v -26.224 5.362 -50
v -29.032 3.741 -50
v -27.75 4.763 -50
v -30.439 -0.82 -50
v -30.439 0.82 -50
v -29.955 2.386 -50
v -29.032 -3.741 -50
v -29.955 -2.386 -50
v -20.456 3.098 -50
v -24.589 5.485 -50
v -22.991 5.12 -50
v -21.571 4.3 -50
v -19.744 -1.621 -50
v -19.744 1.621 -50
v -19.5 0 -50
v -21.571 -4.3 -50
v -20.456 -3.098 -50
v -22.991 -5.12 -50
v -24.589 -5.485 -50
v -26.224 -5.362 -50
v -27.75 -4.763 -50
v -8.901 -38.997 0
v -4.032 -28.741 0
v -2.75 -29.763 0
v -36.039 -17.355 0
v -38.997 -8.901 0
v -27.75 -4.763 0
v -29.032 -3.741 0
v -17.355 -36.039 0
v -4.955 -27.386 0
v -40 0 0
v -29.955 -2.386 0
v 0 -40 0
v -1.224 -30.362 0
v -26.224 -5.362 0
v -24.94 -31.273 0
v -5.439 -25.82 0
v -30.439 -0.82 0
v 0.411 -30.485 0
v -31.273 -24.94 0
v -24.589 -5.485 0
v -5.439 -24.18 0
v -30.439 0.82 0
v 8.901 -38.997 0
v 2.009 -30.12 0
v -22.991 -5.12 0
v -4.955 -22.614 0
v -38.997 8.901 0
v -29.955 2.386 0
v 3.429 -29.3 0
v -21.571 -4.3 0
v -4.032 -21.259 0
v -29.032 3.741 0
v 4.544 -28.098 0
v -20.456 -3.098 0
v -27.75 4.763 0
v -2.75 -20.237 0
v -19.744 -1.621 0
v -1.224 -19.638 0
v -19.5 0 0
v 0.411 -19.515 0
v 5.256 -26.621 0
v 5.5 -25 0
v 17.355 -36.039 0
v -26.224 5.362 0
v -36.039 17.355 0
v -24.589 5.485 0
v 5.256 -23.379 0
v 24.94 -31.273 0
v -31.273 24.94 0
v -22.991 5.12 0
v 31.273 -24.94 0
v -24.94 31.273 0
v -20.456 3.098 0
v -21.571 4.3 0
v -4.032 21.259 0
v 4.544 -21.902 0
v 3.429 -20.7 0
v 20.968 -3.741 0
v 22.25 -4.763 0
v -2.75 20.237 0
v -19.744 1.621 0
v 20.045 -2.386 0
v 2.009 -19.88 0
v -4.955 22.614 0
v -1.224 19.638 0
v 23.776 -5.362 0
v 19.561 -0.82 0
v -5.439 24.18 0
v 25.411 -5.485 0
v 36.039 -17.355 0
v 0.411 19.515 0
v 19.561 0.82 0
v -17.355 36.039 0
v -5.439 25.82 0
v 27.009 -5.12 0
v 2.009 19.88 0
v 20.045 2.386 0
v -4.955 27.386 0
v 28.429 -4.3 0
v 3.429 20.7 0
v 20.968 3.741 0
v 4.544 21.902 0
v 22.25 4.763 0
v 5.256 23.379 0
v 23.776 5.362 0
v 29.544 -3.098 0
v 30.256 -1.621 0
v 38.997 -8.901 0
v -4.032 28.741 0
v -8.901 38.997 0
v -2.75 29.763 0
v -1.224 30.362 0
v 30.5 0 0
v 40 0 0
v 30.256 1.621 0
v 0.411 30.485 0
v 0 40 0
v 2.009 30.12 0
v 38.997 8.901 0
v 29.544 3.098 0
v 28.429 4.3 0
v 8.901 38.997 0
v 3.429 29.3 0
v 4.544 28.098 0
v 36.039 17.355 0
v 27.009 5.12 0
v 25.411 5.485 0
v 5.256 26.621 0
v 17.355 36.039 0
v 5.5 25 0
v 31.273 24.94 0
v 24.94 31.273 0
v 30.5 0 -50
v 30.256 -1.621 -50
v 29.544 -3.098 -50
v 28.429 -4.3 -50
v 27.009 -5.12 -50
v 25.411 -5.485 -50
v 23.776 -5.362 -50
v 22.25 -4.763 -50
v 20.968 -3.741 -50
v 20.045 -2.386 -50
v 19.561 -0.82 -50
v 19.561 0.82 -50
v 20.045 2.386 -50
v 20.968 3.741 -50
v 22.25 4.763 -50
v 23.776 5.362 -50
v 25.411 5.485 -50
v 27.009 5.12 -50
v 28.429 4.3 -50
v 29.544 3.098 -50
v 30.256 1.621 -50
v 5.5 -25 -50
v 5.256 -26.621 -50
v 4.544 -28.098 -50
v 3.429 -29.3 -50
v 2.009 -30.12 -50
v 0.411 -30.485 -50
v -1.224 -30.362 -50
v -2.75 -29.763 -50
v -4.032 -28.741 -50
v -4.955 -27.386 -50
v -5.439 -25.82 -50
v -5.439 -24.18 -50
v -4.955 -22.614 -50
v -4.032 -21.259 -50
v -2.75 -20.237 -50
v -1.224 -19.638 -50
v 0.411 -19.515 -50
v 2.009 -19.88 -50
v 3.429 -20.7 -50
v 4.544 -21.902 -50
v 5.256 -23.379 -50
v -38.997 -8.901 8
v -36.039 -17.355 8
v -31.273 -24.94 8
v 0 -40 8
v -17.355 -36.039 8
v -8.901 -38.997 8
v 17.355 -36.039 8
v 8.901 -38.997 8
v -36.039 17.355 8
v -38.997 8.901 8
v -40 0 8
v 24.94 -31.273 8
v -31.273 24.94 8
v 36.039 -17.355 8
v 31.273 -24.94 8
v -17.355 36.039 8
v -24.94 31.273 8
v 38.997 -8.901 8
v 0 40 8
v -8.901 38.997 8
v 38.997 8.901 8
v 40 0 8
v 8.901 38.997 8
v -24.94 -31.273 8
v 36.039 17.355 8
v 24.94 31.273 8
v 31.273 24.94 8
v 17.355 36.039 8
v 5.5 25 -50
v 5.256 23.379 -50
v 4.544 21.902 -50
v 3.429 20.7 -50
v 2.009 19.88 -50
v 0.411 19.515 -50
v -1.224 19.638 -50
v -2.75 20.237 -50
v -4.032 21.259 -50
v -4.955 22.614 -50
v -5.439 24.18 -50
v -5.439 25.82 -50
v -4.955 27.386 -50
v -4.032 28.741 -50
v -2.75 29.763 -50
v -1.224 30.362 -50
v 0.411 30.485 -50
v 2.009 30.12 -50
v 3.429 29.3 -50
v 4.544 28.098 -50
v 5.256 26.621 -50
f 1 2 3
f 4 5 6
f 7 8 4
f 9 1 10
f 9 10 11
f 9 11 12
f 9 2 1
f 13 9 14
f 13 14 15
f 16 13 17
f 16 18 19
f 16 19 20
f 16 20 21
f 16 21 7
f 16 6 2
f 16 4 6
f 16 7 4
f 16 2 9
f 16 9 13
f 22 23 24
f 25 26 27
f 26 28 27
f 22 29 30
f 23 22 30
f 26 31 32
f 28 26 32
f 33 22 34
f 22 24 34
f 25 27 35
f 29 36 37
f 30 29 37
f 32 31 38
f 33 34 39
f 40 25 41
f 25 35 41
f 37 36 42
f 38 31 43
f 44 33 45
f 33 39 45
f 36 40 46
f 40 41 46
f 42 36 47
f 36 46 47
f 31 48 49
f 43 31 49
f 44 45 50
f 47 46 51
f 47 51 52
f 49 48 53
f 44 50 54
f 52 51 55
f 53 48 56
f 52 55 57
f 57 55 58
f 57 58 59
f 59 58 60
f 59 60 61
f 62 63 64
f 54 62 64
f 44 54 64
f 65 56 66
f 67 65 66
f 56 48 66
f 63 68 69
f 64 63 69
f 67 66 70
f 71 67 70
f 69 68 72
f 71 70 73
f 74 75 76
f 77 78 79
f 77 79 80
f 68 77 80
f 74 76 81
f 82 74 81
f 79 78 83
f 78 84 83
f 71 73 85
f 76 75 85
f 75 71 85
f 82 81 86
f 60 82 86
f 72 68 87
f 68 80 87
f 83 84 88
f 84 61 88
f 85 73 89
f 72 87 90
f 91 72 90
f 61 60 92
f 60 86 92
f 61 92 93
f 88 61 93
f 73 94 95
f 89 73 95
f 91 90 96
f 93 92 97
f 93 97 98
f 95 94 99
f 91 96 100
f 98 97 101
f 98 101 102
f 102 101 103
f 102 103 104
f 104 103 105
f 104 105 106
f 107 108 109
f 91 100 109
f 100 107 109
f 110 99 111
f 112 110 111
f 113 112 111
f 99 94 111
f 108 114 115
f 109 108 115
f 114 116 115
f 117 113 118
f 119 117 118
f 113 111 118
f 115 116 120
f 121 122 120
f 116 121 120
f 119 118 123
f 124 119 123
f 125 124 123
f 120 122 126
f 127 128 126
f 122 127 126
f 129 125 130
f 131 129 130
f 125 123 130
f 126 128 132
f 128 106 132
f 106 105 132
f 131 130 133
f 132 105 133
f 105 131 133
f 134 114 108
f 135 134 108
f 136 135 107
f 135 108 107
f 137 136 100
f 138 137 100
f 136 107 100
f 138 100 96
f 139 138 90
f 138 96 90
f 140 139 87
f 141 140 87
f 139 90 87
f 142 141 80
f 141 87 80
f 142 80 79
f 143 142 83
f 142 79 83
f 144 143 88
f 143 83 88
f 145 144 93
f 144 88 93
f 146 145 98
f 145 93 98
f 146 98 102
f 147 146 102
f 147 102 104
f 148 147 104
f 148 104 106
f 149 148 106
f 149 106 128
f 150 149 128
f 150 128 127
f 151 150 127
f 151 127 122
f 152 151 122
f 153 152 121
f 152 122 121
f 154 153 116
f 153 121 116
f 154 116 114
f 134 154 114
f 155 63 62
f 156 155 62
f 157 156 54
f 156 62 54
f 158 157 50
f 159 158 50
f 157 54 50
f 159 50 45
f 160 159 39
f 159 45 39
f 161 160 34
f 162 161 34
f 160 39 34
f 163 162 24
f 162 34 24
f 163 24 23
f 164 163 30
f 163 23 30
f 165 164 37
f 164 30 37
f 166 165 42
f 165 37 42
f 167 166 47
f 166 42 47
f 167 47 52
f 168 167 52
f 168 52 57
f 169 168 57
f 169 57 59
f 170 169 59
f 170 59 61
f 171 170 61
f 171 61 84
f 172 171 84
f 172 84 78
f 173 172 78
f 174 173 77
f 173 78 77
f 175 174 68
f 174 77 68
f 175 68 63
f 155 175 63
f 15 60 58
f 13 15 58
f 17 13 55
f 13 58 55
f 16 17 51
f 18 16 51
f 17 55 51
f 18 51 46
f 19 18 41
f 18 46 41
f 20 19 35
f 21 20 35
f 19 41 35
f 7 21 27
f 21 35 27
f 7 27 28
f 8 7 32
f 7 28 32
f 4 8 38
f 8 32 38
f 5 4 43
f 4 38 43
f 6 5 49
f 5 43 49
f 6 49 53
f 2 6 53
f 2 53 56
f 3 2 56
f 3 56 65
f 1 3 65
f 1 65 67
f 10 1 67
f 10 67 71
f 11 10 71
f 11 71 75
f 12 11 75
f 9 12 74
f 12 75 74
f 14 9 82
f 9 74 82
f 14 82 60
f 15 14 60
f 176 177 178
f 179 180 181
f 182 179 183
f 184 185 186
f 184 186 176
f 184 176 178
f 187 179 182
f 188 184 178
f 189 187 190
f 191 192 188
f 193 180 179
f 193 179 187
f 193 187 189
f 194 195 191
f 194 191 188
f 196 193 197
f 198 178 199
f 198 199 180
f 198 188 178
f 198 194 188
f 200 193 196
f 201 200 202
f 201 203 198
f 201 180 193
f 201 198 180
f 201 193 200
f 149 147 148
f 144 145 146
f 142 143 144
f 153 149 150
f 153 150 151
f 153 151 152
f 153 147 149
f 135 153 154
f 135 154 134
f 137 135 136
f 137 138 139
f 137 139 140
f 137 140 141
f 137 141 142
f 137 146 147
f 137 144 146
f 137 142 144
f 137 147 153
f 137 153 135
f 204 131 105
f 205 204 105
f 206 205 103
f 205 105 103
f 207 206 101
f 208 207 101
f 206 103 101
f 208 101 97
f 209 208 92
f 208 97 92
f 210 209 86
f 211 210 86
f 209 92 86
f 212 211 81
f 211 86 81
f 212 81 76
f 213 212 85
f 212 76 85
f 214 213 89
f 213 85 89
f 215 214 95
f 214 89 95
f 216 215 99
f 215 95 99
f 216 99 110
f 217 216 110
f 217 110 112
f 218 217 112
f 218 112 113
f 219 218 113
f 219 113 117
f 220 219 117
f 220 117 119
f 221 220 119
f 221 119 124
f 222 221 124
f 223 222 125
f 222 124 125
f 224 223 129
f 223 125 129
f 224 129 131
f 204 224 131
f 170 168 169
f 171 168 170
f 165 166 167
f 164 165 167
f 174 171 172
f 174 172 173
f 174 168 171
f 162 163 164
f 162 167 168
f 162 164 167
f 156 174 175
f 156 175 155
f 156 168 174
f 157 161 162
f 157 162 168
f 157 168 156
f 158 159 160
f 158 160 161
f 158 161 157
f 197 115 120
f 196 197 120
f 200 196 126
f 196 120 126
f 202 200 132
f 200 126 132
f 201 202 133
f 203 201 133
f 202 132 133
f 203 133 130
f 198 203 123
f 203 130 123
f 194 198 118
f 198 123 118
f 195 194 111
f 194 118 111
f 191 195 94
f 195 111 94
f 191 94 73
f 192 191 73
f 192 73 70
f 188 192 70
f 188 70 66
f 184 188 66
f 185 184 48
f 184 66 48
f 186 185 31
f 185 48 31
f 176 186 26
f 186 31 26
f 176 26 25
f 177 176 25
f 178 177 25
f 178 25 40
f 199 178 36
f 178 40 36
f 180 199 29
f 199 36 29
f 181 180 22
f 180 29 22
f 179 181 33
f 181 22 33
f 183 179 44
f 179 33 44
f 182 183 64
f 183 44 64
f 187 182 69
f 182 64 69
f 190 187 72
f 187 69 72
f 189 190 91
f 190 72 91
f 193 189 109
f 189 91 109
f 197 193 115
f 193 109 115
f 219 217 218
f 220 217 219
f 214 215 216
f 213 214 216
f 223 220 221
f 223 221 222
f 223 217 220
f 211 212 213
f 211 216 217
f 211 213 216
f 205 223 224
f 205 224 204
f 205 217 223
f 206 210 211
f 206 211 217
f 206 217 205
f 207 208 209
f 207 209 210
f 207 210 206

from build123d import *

# Parameters (mm, degrees)
SKETCH_R     = 40
PAD_DEPTH    = 8
SKETCH001_R  = 5.5
PAD001_DEPTH = 50


with BuildPart() as part:
    # Sketch → Pad (new body)
    with BuildSketch(Plane.XY):
        Circle(SKETCH_R)
    extrude(amount=PAD_DEPTH)

    # Sketch001 → Pad001 (new body)
    with BuildSketch(Plane(origin=(0, 0, 0), x_dir=(1, 0, 0), z_dir=(0, 0, -1))):
        with Locations((0, 25)):
            Circle(SKETCH001_R)
        with Locations((-25, 0)):
            Circle(SKETCH001_R)
        with Locations((0, -25)):
            Circle(SKETCH001_R)
        with Locations((25, 0)):
            Circle(SKETCH001_R)
    extrude(amount=PAD001_DEPTH)


solid = part.part
